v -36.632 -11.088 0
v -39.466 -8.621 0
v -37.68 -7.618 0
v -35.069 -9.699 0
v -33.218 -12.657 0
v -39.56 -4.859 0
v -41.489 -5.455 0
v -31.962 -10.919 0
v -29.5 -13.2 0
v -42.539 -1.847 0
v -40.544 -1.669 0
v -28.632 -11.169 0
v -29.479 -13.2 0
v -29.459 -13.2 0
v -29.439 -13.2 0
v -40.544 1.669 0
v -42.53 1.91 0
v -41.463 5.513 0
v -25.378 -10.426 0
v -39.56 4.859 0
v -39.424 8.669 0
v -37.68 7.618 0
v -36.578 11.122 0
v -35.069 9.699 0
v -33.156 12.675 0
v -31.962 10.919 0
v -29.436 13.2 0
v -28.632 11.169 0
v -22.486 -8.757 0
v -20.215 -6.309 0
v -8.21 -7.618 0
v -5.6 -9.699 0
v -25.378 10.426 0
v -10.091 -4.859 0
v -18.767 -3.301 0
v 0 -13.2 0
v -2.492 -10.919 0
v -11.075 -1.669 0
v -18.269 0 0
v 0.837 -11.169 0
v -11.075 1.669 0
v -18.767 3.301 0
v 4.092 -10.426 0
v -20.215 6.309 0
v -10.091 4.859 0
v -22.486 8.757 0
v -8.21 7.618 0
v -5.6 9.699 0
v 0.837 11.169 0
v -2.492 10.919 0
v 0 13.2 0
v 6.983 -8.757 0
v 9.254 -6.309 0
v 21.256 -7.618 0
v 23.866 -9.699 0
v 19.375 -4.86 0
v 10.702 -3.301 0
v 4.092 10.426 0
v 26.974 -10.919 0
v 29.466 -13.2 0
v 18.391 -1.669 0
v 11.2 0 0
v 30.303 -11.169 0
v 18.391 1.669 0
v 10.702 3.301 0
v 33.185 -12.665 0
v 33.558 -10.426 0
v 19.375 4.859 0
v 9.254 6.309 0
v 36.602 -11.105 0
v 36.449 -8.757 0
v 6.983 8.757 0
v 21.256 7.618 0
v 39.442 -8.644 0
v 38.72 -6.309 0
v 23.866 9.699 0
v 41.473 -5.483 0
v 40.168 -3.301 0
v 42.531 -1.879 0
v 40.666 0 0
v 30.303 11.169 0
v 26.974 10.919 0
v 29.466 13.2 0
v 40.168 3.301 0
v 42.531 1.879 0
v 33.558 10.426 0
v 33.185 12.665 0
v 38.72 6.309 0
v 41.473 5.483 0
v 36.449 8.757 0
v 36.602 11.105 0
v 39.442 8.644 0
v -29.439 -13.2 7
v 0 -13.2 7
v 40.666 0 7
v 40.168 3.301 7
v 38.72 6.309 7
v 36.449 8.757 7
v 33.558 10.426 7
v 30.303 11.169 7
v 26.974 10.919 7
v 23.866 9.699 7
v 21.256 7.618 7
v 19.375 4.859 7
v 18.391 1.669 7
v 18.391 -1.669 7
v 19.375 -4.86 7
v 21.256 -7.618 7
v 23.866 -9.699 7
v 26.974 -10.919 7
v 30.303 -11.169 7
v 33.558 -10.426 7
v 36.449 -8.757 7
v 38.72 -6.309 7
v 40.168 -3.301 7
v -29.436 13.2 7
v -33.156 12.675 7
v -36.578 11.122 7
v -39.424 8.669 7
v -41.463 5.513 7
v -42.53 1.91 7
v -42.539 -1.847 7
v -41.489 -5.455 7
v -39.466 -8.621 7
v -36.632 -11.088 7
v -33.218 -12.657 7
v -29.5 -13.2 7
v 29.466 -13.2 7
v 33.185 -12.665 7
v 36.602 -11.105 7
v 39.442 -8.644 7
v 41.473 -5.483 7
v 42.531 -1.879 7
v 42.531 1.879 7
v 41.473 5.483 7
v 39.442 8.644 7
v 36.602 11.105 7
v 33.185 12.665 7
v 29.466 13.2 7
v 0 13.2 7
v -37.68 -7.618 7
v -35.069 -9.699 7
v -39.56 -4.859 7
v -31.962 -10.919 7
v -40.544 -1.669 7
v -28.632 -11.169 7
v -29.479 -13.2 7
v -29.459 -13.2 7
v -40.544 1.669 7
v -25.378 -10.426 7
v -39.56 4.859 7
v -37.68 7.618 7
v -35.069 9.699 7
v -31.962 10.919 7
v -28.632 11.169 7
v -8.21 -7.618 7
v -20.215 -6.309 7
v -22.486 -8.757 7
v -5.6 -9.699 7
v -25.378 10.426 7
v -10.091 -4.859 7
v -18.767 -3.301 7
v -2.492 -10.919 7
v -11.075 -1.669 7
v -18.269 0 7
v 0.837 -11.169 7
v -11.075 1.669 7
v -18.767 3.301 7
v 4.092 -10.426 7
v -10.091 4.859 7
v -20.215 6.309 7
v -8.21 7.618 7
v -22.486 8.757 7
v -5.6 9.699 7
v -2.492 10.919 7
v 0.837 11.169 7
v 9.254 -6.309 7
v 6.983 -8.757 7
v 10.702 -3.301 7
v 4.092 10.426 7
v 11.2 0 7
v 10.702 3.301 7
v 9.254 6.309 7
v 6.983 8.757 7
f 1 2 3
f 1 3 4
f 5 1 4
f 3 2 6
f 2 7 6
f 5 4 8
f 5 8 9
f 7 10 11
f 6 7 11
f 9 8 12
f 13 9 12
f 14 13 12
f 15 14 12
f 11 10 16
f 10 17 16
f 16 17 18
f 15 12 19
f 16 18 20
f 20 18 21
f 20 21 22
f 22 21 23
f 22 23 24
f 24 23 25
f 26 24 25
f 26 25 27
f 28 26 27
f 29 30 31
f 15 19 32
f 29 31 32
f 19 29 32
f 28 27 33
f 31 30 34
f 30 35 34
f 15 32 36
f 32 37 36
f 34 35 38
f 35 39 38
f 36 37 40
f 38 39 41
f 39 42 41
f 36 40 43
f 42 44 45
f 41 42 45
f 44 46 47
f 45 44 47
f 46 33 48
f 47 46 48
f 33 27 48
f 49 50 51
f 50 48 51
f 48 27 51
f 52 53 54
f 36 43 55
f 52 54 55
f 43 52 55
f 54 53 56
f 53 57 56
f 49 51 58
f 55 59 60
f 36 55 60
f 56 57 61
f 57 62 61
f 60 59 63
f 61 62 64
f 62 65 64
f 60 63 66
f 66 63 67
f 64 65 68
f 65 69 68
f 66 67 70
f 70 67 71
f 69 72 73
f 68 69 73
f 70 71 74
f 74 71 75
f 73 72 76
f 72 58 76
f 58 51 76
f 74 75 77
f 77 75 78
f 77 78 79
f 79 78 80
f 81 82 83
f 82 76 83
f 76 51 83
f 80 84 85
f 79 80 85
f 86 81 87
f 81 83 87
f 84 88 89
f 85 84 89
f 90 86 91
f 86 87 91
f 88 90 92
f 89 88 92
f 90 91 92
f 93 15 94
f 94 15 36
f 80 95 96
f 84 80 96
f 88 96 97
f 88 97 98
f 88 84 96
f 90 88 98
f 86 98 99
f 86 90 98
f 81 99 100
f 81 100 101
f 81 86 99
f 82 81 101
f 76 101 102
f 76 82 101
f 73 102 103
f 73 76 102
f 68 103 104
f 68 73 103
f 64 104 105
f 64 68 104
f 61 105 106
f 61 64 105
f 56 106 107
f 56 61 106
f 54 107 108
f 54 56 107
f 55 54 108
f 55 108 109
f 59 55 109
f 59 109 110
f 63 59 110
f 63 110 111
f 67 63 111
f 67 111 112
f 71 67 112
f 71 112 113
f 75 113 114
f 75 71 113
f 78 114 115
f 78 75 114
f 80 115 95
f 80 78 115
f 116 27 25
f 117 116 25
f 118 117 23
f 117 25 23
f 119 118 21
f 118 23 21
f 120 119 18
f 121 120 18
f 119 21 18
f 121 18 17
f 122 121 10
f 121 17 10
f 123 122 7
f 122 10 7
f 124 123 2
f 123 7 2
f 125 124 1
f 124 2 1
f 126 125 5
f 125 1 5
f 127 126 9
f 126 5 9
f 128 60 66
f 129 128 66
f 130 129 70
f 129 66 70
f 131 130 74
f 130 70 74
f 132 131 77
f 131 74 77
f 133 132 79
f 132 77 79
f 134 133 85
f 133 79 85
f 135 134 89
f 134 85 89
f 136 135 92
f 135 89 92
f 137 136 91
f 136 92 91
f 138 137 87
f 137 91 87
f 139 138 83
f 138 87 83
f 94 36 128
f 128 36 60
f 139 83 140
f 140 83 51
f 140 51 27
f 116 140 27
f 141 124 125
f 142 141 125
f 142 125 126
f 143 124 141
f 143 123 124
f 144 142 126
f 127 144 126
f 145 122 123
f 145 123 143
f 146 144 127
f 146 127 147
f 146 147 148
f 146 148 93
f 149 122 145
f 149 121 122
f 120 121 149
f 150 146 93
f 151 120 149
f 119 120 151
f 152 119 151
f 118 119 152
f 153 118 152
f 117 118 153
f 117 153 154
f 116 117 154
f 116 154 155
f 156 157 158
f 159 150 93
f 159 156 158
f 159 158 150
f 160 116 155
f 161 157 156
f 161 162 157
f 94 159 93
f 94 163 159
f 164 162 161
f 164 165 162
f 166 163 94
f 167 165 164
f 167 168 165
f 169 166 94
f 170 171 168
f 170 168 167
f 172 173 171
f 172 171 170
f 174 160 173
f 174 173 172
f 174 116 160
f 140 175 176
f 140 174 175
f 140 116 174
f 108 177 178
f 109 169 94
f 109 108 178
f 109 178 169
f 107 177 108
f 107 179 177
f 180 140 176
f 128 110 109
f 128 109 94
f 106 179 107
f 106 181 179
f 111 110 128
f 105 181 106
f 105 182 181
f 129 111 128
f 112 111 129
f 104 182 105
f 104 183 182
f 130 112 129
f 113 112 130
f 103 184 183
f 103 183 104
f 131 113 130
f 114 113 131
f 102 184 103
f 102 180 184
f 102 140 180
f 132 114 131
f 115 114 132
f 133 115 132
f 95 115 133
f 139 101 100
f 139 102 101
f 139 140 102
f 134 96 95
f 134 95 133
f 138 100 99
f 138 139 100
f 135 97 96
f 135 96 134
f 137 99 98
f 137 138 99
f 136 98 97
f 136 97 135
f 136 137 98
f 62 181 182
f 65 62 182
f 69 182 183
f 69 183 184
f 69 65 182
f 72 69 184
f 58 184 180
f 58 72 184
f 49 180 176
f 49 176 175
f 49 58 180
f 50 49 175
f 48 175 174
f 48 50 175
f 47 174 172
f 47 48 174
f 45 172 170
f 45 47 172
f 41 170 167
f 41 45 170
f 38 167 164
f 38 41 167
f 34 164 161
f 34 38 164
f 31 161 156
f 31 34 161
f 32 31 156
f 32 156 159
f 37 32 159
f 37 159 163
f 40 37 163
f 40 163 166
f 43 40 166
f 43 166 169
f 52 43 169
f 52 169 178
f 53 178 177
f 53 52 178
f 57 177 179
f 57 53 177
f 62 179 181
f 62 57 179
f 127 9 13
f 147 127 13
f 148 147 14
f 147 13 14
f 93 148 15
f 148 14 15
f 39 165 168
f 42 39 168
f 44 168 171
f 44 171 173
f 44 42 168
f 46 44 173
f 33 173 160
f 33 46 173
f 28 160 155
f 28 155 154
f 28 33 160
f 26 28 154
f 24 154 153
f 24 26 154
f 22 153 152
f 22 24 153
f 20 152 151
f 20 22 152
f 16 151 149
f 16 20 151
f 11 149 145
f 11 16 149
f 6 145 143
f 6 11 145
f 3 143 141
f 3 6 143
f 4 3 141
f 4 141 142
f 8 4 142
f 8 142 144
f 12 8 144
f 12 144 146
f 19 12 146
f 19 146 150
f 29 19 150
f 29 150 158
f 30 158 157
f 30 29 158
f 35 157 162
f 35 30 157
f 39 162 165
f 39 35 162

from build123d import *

# Parameters (mm, degrees)
F0_R     = 11.2
F1_DEPTH = 7


# Not quite as in the source:
# - ends of sketch curves that miss each other by under 0.0002 mm in the source are joined


with BuildPart() as f1:
    # F0 (on Top) → F1 (new body)
    with BuildSketch(Plane.XY):
        with BuildLine():
            ThreePointArc((-8.6004e-06, -13.2), (-13.2, 0), (-8.6004e-06, 13.2))
            Line((-8.6004e-06, 13.2), (-29.4360226951, 13.1999579737))
            ThreePointArc((-29.4360226951, 13.1999579737), (-42.6692934144, 0.0318031051), (-29.4996289049, -13.1999652303))
            ThreePointArc((-29.4996289049, -13.1999652303), (-29.4693403268, -13.2), (-29.4390517487, -13.1999652698))
            Line((-29.4390517487, -13.1999652698), (-8.6004e-06, -13.2))
        make_face()
        with Locations((-29.4693317264, 0)):
            Circle(F0_R, mode=Mode.SUBTRACT)
        with BuildLine():
            ThreePointArc((-8.6004e-06, 13.2), (9.333806471, 9.3338125524), (13.2, 0))
            ThreePointArc((13.2, 0), (9.333806471, -9.3338125524), (-8.6004e-06, -13.2))
            Line((-8.6004e-06, -13.2), (29.4658418158, -13.200003649))
            ThreePointArc((29.4658418158, -13.200003649), (42.6658504162, -3.649e-06), (29.4658418158, 13.199996351))
            Line((29.4658418158, 13.199996351), (-8.6004e-06, 13.2))
        make_face()
        with Locations((29.4658504162, -3.649e-06)):
            Circle(F0_R, mode=Mode.SUBTRACT)
        with BuildLine():
            ThreePointArc((-8.6004e-06, -13.2), (9.333806471, -9.3338125524), (13.2, 0))
            ThreePointArc((13.2, 0), (9.333806471, 9.3338125524), (-8.6004e-06, 13.2))
            ThreePointArc((-8.6004e-06, 13.2), (-13.2, 0), (-8.6004e-06, -13.2))
        make_face()
        Circle(F0_R, mode=Mode.SUBTRACT)
    extrude(amount=F1_DEPTH)


solid = f1.part
